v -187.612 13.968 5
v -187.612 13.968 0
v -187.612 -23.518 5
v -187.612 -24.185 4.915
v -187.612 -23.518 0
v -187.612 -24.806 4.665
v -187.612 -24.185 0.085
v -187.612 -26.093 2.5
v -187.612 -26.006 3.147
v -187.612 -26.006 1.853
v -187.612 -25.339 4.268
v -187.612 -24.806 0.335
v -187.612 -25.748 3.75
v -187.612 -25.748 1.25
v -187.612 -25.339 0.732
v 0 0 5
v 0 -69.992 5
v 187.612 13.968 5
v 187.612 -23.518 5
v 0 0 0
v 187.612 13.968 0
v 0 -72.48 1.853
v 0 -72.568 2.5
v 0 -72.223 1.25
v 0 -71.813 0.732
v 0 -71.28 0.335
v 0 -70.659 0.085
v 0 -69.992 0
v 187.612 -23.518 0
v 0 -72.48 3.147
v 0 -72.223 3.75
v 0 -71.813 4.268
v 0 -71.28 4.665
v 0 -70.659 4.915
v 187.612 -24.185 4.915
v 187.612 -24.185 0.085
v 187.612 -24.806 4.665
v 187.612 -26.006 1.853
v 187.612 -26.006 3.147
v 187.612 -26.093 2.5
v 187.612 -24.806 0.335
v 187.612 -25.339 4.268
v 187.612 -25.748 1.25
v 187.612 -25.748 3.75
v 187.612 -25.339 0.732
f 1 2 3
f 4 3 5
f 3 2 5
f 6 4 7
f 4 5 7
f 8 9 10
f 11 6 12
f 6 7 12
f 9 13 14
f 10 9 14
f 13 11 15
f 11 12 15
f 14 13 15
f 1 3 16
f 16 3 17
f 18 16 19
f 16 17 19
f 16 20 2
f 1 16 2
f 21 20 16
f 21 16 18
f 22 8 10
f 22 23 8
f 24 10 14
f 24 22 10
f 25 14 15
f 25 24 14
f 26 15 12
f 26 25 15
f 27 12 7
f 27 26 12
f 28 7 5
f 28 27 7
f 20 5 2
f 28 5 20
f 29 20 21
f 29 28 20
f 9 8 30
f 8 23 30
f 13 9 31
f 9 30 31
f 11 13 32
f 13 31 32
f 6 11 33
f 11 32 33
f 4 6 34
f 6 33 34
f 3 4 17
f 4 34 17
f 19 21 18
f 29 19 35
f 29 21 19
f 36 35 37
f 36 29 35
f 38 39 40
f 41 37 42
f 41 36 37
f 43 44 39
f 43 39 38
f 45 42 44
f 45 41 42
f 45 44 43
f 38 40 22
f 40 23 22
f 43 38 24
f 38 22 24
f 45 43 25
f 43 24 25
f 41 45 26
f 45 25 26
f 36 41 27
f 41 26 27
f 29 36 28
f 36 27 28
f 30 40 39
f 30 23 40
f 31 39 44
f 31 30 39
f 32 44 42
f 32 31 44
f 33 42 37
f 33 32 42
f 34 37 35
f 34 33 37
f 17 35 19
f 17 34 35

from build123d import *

# Parameters (mm, degrees)
F1_DEPTH = 5
F2_R     = 2.5
F3_R     = 2.49999
F7_ANGLE = 180


# Not quite as in the source:
# - a fillet or chamfer is up to 0.001 mm smaller than in the source, because OpenCascade refuses the exact size


with BuildPart() as f1:
    # F0 (on Top) → F1 (new body)
    with BuildSketch(Plane.XY):
        Polygon((0, 72.5676417351), (0, 0), (187.6123100519, -13.9679014683), (187.6123100519, 26.09346807), align=None)
    extrude(amount=F1_DEPTH)

    # F2
    f2_edges = [f1.edges().sort_by_distance(p)[0] for p in [
        (93.806155, 49.330555, 5),
    ]]
    fillet(f2_edges, radius=F2_R)

    # F3 (radius 2.5 in the source; OpenCascade refuses exactly that, so slightly less here)
    f3_edges = [f1.edges().sort_by_distance(p)[0] for p in [
        (93.806155, 49.330555, 0),
    ]]
    fillet(f3_edges, radius=F3_R)


with BuildPart() as f4_1:
    # F4: instance of F1
    add(f1.part.mirror(Plane.YZ))


with BuildPart() as f1_1:
    add(f1.part)

    add(f4_1.part)  # F5 merges F4_1
    # F5: F1 across plane
    add(f1.part.mirror(Plane.YZ))


with BuildPart() as f1_2:
    # F7: moved
    add(f1_1.part.rotate(Axis((0, 0, 62.2569620609), (0, 0, 1)), F7_ANGLE))


solid = f1_2.part
